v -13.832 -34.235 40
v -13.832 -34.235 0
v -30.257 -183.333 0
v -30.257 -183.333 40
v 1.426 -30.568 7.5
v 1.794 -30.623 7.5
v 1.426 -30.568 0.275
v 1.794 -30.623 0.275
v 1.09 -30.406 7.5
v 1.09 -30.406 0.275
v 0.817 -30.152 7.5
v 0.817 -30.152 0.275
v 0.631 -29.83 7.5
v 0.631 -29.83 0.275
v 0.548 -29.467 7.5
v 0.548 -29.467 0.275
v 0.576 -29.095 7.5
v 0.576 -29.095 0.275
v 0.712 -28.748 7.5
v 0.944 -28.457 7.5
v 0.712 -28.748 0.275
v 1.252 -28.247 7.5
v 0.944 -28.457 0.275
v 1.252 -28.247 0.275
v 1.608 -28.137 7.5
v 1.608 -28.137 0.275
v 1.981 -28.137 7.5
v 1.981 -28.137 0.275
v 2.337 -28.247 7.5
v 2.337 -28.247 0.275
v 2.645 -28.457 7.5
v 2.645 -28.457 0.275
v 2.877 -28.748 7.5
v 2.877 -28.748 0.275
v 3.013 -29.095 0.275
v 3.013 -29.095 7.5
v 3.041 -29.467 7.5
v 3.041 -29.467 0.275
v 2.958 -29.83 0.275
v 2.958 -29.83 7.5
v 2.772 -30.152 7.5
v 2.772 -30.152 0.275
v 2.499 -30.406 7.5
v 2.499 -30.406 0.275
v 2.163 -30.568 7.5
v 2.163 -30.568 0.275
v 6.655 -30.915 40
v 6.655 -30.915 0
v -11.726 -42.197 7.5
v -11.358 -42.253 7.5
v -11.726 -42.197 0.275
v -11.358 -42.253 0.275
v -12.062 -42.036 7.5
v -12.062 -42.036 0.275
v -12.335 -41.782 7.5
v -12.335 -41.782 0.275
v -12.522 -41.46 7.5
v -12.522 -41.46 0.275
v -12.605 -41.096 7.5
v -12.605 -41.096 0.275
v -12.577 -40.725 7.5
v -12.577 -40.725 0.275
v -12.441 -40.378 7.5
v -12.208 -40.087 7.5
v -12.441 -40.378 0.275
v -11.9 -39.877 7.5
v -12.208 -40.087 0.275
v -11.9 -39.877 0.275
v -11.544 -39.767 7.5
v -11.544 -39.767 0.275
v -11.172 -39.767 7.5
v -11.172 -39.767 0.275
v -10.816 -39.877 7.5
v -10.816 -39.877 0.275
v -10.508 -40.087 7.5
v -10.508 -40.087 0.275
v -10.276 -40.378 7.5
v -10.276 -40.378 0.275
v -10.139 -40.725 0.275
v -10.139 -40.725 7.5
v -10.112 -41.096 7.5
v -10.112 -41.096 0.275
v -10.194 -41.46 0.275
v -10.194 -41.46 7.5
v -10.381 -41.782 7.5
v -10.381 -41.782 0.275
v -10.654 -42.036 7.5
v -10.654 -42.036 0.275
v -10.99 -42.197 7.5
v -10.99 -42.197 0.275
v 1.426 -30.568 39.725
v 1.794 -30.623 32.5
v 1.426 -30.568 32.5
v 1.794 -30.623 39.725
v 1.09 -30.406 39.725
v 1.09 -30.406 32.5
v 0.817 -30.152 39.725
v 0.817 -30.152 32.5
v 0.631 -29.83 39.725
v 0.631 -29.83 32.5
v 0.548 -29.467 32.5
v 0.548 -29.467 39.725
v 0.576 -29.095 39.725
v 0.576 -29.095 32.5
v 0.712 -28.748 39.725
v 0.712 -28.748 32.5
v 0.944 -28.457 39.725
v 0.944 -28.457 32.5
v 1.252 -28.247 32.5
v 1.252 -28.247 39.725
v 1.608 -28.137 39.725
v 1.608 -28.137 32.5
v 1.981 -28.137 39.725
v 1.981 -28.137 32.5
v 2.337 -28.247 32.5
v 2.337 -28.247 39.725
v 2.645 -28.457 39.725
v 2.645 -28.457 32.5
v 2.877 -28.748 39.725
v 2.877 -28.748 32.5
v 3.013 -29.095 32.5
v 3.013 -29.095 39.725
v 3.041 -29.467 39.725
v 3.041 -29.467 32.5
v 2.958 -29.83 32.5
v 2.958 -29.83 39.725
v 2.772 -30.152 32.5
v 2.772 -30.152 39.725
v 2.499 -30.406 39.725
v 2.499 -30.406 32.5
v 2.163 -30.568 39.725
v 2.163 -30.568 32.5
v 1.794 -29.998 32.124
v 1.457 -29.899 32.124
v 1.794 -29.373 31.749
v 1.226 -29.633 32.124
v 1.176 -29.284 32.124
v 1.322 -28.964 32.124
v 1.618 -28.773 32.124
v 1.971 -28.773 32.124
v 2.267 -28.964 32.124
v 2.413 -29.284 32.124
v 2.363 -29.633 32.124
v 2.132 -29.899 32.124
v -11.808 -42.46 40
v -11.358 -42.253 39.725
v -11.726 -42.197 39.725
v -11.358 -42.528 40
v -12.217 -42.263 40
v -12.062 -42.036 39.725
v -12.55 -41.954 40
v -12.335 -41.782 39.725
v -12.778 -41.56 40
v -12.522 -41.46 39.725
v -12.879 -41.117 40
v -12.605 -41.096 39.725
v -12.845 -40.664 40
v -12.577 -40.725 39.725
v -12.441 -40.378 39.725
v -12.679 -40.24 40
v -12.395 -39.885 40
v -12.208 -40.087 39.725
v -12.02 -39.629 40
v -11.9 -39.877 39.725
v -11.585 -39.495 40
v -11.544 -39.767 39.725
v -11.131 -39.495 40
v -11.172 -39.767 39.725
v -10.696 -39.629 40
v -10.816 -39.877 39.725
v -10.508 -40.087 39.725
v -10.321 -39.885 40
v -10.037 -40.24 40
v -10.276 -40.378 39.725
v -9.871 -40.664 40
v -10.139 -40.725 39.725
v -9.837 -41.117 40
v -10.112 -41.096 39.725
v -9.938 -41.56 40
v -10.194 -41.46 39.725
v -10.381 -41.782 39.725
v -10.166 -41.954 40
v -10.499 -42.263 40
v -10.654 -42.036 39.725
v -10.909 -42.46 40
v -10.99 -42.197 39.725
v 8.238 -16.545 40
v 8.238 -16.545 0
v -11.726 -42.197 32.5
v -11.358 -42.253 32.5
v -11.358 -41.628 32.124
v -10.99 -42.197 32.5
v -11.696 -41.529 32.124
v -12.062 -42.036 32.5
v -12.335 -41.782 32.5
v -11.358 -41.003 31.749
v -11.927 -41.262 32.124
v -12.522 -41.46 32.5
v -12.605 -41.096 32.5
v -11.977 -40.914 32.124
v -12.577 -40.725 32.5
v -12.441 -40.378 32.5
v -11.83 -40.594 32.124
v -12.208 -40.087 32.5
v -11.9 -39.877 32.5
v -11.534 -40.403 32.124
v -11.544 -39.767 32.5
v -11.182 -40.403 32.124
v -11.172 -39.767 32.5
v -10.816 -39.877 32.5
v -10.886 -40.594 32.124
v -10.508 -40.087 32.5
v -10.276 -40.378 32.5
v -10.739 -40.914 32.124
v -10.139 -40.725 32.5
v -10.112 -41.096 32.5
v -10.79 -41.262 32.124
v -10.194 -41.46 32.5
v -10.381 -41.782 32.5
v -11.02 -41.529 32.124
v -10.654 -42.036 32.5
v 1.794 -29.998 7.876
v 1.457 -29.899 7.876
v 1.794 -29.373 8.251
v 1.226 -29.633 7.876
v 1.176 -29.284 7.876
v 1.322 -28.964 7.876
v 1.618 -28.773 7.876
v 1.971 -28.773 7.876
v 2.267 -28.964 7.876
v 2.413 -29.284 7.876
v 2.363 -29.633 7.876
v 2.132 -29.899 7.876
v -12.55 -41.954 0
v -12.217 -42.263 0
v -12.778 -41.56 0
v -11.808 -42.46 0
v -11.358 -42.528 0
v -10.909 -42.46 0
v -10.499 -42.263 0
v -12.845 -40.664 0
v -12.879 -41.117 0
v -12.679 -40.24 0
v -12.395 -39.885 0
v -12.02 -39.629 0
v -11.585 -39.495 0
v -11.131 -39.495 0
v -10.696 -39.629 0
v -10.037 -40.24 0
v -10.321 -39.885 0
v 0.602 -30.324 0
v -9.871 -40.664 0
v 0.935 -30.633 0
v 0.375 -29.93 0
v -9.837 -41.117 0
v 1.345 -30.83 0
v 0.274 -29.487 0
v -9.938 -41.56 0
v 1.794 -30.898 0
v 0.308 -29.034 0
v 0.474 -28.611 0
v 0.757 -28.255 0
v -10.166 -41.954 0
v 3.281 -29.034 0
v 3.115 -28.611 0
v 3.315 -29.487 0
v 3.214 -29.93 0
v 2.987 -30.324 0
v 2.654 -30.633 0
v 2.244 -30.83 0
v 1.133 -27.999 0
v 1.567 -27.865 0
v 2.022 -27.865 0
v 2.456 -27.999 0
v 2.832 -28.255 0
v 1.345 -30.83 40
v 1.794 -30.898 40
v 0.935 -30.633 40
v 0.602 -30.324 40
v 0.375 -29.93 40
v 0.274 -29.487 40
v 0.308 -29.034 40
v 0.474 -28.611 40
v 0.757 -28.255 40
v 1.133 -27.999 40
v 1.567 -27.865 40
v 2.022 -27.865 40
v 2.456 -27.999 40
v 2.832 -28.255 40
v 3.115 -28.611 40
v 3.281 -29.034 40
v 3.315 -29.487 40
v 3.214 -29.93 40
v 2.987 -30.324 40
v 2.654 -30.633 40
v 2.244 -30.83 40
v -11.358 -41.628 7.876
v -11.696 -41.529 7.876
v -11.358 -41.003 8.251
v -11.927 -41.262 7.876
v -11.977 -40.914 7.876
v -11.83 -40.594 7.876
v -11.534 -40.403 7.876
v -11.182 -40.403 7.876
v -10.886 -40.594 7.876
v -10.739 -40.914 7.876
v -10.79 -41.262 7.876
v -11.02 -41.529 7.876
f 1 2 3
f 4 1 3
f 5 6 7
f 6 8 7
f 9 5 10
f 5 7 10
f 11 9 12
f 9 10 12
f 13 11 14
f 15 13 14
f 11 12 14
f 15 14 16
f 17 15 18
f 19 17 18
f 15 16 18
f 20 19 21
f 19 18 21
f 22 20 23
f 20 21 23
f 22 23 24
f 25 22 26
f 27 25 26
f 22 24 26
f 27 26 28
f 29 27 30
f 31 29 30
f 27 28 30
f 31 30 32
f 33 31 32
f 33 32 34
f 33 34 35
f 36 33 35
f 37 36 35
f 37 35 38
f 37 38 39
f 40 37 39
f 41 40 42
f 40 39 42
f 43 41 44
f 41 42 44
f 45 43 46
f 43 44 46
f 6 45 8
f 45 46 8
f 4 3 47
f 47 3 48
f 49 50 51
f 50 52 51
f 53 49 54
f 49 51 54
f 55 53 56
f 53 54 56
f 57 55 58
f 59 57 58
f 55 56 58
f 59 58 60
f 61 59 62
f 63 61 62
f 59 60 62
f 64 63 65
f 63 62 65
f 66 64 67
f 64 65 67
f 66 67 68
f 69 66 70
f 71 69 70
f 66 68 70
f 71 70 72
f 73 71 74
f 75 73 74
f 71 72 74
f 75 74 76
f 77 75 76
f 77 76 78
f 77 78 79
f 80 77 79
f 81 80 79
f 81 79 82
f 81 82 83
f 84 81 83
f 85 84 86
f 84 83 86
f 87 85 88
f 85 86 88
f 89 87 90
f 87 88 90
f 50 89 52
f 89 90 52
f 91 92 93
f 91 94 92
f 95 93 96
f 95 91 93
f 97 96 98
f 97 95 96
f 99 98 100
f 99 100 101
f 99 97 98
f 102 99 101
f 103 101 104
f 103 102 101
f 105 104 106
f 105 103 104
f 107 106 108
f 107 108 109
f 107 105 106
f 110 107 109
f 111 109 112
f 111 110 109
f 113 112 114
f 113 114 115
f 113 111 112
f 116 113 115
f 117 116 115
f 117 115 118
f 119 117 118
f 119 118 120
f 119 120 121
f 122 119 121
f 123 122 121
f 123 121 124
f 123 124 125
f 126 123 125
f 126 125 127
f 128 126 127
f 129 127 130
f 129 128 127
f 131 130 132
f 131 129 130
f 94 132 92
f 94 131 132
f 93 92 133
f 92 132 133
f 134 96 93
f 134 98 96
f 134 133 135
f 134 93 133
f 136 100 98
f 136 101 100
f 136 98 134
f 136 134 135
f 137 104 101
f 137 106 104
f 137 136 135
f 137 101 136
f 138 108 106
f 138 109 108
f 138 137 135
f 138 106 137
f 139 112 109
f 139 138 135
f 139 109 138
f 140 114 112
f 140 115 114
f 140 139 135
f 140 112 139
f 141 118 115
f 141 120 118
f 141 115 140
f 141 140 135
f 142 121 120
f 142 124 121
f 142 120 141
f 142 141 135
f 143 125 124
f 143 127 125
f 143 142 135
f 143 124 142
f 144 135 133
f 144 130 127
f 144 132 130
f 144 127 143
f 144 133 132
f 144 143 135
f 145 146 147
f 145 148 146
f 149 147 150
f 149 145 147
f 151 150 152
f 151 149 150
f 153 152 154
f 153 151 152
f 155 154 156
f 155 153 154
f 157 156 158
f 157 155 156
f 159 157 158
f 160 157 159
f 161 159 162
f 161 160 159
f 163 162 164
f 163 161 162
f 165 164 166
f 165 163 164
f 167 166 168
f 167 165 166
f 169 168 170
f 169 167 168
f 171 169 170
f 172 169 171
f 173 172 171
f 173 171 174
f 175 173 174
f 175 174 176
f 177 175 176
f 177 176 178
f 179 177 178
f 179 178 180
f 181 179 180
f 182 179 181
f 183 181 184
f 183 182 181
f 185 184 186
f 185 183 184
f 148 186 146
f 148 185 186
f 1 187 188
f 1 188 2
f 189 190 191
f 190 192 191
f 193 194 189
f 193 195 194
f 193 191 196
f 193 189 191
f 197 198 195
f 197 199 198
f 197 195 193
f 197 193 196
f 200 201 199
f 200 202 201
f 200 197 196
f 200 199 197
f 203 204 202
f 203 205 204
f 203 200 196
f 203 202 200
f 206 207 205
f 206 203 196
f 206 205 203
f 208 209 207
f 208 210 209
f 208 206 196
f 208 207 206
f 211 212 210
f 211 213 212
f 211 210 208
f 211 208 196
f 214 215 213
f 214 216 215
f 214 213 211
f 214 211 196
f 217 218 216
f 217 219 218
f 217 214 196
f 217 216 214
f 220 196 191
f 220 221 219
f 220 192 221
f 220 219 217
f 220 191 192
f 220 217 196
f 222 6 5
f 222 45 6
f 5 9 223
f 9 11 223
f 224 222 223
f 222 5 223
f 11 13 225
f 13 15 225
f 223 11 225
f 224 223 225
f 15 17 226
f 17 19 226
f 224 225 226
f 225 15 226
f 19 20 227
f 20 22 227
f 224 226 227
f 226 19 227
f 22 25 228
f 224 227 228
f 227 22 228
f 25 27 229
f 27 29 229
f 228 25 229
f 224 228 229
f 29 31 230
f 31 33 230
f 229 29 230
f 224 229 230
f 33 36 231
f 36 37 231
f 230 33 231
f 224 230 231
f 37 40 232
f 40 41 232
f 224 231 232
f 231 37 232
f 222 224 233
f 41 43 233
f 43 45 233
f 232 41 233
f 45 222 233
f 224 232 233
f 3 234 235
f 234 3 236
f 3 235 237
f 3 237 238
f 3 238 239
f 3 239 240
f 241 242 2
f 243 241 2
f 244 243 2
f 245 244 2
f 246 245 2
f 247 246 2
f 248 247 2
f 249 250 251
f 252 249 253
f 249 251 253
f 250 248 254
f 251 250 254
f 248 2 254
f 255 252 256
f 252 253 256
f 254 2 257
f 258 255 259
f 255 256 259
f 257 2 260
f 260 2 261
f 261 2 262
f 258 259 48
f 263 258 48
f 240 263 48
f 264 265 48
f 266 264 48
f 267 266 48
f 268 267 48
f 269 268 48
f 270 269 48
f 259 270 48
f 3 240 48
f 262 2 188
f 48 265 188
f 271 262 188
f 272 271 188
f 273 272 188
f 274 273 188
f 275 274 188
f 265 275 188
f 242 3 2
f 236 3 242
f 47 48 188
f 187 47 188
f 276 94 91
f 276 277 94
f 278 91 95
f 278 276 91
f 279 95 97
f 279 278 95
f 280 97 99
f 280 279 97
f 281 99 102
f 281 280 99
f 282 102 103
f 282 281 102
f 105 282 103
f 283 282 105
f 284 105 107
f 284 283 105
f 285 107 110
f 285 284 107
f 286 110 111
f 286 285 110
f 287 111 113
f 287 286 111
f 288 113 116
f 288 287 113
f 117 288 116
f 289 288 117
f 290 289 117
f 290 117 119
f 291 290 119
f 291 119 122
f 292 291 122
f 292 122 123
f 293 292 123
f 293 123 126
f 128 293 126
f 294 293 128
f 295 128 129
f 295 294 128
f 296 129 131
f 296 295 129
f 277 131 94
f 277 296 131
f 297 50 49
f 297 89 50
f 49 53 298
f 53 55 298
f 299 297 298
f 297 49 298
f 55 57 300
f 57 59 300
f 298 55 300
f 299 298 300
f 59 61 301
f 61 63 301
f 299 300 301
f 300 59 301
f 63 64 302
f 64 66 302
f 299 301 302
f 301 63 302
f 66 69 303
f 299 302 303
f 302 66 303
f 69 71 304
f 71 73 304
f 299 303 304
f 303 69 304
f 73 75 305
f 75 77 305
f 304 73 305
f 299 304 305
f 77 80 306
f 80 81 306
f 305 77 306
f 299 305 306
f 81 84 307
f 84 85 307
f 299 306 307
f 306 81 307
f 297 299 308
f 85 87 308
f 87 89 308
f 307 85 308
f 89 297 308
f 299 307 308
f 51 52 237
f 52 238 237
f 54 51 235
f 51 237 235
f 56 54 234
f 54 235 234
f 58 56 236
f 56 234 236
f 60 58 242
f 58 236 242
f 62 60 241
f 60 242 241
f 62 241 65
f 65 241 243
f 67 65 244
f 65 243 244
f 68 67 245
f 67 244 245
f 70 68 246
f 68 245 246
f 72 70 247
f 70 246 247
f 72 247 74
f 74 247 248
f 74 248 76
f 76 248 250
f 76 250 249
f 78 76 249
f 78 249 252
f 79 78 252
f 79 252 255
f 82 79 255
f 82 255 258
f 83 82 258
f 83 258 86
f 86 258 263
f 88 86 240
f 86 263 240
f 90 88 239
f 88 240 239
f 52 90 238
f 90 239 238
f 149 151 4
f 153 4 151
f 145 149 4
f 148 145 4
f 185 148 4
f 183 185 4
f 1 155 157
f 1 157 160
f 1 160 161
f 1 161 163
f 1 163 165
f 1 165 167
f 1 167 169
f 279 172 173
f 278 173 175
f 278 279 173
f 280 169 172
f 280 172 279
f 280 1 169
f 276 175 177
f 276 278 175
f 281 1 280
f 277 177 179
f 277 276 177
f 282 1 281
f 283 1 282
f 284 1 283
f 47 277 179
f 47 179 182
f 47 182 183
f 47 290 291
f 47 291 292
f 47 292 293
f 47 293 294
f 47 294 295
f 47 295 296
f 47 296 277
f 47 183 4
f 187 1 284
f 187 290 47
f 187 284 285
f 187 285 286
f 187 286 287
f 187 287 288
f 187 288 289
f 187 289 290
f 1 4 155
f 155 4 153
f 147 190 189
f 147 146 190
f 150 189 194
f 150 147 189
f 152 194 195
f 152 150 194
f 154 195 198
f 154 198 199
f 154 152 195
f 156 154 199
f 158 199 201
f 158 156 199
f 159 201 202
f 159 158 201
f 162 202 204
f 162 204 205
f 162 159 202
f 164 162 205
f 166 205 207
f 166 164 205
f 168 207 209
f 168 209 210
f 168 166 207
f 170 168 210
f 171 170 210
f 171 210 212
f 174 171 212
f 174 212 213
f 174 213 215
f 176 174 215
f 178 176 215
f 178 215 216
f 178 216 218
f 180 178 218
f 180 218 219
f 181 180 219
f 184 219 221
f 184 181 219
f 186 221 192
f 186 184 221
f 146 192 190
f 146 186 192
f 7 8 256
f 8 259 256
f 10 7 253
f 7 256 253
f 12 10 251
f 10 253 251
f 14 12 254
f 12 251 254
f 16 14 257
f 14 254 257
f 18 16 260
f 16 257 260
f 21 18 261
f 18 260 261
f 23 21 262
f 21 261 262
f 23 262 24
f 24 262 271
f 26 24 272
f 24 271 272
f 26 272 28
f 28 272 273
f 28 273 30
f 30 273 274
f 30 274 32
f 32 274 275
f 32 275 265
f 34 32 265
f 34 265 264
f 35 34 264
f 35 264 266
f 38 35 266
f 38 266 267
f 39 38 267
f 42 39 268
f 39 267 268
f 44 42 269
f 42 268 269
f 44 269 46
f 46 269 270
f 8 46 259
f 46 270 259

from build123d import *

# Parameters (mm, degrees)
EXTRUDE_1_DEPTH             = 40
HOLE_WIZARD_M3_1_AT_2_COUNT = 2
HOLE_WIZARD_M3_1_AT_2_PITCH = 17.556765078


with BuildPart() as part:
    # 草图1 → 凸台-拉伸1 (new body)
    with BuildSketch(Plane.XY):
        Polygon((8.237882641, -16.544998045), (-13.831826124, -34.234767829), (-30.256597299, -183.33281239), (6.654915402, -30.914593657), align=None)
    extrude(amount=EXTRUDE_1_DEPTH)

    # 草图5 → M3 螺纹孔1 (revolve, cut)
    with BuildSketch(Plane(origin=(-11.358047282, -41.00286285, 40), x_dir=(0, -1, 0), z_dir=(1, 0, 0))):
        Polygon((0, 0), (0, 8.251075774), (1.25, 7.5), (1.25, 0.275), (1.525, 0), align=None)
    hole_wizard_m3_1 = revolve(axis=Axis((-11.358047282, -41.00286285, 46.35), (0, 0, -1)), mode=Mode.SUBTRACT)

    # M3 螺纹孔1 at 2: M3 螺纹孔1 ×2
    with Locations(*[Vector(0.749142925, 0.662408392, 0) * (i * HOLE_WIZARD_M3_1_AT_2_PITCH) for i in range(1, HOLE_WIZARD_M3_1_AT_2_COUNT)]):
        add(hole_wizard_m3_1, mode=Mode.SUBTRACT)

    # 镜向1: M3 螺纹孔1 across plane
    add(hole_wizard_m3_1.mirror(Plane.XY.offset(20)), mode=Mode.SUBTRACT)

    # 镜向1 copy 1 sketch → 镜向1 copy 1 (revolve, cut)
    with BuildSketch(Plane(origin=(1.794479058, -29.373114321, 0), x_dir=(0, -1, 0), z_dir=(1, 0, 0))):
        Polygon((0, 0), (0, -8.251075774), (1.25, -7.5), (1.25, -0.275), (1.525, 0), align=None)
    revolve(axis=Axis((1.794479058, -29.373114321, -6.35), (0, 0, -1)), mode=Mode.SUBTRACT)


solid = part.part
